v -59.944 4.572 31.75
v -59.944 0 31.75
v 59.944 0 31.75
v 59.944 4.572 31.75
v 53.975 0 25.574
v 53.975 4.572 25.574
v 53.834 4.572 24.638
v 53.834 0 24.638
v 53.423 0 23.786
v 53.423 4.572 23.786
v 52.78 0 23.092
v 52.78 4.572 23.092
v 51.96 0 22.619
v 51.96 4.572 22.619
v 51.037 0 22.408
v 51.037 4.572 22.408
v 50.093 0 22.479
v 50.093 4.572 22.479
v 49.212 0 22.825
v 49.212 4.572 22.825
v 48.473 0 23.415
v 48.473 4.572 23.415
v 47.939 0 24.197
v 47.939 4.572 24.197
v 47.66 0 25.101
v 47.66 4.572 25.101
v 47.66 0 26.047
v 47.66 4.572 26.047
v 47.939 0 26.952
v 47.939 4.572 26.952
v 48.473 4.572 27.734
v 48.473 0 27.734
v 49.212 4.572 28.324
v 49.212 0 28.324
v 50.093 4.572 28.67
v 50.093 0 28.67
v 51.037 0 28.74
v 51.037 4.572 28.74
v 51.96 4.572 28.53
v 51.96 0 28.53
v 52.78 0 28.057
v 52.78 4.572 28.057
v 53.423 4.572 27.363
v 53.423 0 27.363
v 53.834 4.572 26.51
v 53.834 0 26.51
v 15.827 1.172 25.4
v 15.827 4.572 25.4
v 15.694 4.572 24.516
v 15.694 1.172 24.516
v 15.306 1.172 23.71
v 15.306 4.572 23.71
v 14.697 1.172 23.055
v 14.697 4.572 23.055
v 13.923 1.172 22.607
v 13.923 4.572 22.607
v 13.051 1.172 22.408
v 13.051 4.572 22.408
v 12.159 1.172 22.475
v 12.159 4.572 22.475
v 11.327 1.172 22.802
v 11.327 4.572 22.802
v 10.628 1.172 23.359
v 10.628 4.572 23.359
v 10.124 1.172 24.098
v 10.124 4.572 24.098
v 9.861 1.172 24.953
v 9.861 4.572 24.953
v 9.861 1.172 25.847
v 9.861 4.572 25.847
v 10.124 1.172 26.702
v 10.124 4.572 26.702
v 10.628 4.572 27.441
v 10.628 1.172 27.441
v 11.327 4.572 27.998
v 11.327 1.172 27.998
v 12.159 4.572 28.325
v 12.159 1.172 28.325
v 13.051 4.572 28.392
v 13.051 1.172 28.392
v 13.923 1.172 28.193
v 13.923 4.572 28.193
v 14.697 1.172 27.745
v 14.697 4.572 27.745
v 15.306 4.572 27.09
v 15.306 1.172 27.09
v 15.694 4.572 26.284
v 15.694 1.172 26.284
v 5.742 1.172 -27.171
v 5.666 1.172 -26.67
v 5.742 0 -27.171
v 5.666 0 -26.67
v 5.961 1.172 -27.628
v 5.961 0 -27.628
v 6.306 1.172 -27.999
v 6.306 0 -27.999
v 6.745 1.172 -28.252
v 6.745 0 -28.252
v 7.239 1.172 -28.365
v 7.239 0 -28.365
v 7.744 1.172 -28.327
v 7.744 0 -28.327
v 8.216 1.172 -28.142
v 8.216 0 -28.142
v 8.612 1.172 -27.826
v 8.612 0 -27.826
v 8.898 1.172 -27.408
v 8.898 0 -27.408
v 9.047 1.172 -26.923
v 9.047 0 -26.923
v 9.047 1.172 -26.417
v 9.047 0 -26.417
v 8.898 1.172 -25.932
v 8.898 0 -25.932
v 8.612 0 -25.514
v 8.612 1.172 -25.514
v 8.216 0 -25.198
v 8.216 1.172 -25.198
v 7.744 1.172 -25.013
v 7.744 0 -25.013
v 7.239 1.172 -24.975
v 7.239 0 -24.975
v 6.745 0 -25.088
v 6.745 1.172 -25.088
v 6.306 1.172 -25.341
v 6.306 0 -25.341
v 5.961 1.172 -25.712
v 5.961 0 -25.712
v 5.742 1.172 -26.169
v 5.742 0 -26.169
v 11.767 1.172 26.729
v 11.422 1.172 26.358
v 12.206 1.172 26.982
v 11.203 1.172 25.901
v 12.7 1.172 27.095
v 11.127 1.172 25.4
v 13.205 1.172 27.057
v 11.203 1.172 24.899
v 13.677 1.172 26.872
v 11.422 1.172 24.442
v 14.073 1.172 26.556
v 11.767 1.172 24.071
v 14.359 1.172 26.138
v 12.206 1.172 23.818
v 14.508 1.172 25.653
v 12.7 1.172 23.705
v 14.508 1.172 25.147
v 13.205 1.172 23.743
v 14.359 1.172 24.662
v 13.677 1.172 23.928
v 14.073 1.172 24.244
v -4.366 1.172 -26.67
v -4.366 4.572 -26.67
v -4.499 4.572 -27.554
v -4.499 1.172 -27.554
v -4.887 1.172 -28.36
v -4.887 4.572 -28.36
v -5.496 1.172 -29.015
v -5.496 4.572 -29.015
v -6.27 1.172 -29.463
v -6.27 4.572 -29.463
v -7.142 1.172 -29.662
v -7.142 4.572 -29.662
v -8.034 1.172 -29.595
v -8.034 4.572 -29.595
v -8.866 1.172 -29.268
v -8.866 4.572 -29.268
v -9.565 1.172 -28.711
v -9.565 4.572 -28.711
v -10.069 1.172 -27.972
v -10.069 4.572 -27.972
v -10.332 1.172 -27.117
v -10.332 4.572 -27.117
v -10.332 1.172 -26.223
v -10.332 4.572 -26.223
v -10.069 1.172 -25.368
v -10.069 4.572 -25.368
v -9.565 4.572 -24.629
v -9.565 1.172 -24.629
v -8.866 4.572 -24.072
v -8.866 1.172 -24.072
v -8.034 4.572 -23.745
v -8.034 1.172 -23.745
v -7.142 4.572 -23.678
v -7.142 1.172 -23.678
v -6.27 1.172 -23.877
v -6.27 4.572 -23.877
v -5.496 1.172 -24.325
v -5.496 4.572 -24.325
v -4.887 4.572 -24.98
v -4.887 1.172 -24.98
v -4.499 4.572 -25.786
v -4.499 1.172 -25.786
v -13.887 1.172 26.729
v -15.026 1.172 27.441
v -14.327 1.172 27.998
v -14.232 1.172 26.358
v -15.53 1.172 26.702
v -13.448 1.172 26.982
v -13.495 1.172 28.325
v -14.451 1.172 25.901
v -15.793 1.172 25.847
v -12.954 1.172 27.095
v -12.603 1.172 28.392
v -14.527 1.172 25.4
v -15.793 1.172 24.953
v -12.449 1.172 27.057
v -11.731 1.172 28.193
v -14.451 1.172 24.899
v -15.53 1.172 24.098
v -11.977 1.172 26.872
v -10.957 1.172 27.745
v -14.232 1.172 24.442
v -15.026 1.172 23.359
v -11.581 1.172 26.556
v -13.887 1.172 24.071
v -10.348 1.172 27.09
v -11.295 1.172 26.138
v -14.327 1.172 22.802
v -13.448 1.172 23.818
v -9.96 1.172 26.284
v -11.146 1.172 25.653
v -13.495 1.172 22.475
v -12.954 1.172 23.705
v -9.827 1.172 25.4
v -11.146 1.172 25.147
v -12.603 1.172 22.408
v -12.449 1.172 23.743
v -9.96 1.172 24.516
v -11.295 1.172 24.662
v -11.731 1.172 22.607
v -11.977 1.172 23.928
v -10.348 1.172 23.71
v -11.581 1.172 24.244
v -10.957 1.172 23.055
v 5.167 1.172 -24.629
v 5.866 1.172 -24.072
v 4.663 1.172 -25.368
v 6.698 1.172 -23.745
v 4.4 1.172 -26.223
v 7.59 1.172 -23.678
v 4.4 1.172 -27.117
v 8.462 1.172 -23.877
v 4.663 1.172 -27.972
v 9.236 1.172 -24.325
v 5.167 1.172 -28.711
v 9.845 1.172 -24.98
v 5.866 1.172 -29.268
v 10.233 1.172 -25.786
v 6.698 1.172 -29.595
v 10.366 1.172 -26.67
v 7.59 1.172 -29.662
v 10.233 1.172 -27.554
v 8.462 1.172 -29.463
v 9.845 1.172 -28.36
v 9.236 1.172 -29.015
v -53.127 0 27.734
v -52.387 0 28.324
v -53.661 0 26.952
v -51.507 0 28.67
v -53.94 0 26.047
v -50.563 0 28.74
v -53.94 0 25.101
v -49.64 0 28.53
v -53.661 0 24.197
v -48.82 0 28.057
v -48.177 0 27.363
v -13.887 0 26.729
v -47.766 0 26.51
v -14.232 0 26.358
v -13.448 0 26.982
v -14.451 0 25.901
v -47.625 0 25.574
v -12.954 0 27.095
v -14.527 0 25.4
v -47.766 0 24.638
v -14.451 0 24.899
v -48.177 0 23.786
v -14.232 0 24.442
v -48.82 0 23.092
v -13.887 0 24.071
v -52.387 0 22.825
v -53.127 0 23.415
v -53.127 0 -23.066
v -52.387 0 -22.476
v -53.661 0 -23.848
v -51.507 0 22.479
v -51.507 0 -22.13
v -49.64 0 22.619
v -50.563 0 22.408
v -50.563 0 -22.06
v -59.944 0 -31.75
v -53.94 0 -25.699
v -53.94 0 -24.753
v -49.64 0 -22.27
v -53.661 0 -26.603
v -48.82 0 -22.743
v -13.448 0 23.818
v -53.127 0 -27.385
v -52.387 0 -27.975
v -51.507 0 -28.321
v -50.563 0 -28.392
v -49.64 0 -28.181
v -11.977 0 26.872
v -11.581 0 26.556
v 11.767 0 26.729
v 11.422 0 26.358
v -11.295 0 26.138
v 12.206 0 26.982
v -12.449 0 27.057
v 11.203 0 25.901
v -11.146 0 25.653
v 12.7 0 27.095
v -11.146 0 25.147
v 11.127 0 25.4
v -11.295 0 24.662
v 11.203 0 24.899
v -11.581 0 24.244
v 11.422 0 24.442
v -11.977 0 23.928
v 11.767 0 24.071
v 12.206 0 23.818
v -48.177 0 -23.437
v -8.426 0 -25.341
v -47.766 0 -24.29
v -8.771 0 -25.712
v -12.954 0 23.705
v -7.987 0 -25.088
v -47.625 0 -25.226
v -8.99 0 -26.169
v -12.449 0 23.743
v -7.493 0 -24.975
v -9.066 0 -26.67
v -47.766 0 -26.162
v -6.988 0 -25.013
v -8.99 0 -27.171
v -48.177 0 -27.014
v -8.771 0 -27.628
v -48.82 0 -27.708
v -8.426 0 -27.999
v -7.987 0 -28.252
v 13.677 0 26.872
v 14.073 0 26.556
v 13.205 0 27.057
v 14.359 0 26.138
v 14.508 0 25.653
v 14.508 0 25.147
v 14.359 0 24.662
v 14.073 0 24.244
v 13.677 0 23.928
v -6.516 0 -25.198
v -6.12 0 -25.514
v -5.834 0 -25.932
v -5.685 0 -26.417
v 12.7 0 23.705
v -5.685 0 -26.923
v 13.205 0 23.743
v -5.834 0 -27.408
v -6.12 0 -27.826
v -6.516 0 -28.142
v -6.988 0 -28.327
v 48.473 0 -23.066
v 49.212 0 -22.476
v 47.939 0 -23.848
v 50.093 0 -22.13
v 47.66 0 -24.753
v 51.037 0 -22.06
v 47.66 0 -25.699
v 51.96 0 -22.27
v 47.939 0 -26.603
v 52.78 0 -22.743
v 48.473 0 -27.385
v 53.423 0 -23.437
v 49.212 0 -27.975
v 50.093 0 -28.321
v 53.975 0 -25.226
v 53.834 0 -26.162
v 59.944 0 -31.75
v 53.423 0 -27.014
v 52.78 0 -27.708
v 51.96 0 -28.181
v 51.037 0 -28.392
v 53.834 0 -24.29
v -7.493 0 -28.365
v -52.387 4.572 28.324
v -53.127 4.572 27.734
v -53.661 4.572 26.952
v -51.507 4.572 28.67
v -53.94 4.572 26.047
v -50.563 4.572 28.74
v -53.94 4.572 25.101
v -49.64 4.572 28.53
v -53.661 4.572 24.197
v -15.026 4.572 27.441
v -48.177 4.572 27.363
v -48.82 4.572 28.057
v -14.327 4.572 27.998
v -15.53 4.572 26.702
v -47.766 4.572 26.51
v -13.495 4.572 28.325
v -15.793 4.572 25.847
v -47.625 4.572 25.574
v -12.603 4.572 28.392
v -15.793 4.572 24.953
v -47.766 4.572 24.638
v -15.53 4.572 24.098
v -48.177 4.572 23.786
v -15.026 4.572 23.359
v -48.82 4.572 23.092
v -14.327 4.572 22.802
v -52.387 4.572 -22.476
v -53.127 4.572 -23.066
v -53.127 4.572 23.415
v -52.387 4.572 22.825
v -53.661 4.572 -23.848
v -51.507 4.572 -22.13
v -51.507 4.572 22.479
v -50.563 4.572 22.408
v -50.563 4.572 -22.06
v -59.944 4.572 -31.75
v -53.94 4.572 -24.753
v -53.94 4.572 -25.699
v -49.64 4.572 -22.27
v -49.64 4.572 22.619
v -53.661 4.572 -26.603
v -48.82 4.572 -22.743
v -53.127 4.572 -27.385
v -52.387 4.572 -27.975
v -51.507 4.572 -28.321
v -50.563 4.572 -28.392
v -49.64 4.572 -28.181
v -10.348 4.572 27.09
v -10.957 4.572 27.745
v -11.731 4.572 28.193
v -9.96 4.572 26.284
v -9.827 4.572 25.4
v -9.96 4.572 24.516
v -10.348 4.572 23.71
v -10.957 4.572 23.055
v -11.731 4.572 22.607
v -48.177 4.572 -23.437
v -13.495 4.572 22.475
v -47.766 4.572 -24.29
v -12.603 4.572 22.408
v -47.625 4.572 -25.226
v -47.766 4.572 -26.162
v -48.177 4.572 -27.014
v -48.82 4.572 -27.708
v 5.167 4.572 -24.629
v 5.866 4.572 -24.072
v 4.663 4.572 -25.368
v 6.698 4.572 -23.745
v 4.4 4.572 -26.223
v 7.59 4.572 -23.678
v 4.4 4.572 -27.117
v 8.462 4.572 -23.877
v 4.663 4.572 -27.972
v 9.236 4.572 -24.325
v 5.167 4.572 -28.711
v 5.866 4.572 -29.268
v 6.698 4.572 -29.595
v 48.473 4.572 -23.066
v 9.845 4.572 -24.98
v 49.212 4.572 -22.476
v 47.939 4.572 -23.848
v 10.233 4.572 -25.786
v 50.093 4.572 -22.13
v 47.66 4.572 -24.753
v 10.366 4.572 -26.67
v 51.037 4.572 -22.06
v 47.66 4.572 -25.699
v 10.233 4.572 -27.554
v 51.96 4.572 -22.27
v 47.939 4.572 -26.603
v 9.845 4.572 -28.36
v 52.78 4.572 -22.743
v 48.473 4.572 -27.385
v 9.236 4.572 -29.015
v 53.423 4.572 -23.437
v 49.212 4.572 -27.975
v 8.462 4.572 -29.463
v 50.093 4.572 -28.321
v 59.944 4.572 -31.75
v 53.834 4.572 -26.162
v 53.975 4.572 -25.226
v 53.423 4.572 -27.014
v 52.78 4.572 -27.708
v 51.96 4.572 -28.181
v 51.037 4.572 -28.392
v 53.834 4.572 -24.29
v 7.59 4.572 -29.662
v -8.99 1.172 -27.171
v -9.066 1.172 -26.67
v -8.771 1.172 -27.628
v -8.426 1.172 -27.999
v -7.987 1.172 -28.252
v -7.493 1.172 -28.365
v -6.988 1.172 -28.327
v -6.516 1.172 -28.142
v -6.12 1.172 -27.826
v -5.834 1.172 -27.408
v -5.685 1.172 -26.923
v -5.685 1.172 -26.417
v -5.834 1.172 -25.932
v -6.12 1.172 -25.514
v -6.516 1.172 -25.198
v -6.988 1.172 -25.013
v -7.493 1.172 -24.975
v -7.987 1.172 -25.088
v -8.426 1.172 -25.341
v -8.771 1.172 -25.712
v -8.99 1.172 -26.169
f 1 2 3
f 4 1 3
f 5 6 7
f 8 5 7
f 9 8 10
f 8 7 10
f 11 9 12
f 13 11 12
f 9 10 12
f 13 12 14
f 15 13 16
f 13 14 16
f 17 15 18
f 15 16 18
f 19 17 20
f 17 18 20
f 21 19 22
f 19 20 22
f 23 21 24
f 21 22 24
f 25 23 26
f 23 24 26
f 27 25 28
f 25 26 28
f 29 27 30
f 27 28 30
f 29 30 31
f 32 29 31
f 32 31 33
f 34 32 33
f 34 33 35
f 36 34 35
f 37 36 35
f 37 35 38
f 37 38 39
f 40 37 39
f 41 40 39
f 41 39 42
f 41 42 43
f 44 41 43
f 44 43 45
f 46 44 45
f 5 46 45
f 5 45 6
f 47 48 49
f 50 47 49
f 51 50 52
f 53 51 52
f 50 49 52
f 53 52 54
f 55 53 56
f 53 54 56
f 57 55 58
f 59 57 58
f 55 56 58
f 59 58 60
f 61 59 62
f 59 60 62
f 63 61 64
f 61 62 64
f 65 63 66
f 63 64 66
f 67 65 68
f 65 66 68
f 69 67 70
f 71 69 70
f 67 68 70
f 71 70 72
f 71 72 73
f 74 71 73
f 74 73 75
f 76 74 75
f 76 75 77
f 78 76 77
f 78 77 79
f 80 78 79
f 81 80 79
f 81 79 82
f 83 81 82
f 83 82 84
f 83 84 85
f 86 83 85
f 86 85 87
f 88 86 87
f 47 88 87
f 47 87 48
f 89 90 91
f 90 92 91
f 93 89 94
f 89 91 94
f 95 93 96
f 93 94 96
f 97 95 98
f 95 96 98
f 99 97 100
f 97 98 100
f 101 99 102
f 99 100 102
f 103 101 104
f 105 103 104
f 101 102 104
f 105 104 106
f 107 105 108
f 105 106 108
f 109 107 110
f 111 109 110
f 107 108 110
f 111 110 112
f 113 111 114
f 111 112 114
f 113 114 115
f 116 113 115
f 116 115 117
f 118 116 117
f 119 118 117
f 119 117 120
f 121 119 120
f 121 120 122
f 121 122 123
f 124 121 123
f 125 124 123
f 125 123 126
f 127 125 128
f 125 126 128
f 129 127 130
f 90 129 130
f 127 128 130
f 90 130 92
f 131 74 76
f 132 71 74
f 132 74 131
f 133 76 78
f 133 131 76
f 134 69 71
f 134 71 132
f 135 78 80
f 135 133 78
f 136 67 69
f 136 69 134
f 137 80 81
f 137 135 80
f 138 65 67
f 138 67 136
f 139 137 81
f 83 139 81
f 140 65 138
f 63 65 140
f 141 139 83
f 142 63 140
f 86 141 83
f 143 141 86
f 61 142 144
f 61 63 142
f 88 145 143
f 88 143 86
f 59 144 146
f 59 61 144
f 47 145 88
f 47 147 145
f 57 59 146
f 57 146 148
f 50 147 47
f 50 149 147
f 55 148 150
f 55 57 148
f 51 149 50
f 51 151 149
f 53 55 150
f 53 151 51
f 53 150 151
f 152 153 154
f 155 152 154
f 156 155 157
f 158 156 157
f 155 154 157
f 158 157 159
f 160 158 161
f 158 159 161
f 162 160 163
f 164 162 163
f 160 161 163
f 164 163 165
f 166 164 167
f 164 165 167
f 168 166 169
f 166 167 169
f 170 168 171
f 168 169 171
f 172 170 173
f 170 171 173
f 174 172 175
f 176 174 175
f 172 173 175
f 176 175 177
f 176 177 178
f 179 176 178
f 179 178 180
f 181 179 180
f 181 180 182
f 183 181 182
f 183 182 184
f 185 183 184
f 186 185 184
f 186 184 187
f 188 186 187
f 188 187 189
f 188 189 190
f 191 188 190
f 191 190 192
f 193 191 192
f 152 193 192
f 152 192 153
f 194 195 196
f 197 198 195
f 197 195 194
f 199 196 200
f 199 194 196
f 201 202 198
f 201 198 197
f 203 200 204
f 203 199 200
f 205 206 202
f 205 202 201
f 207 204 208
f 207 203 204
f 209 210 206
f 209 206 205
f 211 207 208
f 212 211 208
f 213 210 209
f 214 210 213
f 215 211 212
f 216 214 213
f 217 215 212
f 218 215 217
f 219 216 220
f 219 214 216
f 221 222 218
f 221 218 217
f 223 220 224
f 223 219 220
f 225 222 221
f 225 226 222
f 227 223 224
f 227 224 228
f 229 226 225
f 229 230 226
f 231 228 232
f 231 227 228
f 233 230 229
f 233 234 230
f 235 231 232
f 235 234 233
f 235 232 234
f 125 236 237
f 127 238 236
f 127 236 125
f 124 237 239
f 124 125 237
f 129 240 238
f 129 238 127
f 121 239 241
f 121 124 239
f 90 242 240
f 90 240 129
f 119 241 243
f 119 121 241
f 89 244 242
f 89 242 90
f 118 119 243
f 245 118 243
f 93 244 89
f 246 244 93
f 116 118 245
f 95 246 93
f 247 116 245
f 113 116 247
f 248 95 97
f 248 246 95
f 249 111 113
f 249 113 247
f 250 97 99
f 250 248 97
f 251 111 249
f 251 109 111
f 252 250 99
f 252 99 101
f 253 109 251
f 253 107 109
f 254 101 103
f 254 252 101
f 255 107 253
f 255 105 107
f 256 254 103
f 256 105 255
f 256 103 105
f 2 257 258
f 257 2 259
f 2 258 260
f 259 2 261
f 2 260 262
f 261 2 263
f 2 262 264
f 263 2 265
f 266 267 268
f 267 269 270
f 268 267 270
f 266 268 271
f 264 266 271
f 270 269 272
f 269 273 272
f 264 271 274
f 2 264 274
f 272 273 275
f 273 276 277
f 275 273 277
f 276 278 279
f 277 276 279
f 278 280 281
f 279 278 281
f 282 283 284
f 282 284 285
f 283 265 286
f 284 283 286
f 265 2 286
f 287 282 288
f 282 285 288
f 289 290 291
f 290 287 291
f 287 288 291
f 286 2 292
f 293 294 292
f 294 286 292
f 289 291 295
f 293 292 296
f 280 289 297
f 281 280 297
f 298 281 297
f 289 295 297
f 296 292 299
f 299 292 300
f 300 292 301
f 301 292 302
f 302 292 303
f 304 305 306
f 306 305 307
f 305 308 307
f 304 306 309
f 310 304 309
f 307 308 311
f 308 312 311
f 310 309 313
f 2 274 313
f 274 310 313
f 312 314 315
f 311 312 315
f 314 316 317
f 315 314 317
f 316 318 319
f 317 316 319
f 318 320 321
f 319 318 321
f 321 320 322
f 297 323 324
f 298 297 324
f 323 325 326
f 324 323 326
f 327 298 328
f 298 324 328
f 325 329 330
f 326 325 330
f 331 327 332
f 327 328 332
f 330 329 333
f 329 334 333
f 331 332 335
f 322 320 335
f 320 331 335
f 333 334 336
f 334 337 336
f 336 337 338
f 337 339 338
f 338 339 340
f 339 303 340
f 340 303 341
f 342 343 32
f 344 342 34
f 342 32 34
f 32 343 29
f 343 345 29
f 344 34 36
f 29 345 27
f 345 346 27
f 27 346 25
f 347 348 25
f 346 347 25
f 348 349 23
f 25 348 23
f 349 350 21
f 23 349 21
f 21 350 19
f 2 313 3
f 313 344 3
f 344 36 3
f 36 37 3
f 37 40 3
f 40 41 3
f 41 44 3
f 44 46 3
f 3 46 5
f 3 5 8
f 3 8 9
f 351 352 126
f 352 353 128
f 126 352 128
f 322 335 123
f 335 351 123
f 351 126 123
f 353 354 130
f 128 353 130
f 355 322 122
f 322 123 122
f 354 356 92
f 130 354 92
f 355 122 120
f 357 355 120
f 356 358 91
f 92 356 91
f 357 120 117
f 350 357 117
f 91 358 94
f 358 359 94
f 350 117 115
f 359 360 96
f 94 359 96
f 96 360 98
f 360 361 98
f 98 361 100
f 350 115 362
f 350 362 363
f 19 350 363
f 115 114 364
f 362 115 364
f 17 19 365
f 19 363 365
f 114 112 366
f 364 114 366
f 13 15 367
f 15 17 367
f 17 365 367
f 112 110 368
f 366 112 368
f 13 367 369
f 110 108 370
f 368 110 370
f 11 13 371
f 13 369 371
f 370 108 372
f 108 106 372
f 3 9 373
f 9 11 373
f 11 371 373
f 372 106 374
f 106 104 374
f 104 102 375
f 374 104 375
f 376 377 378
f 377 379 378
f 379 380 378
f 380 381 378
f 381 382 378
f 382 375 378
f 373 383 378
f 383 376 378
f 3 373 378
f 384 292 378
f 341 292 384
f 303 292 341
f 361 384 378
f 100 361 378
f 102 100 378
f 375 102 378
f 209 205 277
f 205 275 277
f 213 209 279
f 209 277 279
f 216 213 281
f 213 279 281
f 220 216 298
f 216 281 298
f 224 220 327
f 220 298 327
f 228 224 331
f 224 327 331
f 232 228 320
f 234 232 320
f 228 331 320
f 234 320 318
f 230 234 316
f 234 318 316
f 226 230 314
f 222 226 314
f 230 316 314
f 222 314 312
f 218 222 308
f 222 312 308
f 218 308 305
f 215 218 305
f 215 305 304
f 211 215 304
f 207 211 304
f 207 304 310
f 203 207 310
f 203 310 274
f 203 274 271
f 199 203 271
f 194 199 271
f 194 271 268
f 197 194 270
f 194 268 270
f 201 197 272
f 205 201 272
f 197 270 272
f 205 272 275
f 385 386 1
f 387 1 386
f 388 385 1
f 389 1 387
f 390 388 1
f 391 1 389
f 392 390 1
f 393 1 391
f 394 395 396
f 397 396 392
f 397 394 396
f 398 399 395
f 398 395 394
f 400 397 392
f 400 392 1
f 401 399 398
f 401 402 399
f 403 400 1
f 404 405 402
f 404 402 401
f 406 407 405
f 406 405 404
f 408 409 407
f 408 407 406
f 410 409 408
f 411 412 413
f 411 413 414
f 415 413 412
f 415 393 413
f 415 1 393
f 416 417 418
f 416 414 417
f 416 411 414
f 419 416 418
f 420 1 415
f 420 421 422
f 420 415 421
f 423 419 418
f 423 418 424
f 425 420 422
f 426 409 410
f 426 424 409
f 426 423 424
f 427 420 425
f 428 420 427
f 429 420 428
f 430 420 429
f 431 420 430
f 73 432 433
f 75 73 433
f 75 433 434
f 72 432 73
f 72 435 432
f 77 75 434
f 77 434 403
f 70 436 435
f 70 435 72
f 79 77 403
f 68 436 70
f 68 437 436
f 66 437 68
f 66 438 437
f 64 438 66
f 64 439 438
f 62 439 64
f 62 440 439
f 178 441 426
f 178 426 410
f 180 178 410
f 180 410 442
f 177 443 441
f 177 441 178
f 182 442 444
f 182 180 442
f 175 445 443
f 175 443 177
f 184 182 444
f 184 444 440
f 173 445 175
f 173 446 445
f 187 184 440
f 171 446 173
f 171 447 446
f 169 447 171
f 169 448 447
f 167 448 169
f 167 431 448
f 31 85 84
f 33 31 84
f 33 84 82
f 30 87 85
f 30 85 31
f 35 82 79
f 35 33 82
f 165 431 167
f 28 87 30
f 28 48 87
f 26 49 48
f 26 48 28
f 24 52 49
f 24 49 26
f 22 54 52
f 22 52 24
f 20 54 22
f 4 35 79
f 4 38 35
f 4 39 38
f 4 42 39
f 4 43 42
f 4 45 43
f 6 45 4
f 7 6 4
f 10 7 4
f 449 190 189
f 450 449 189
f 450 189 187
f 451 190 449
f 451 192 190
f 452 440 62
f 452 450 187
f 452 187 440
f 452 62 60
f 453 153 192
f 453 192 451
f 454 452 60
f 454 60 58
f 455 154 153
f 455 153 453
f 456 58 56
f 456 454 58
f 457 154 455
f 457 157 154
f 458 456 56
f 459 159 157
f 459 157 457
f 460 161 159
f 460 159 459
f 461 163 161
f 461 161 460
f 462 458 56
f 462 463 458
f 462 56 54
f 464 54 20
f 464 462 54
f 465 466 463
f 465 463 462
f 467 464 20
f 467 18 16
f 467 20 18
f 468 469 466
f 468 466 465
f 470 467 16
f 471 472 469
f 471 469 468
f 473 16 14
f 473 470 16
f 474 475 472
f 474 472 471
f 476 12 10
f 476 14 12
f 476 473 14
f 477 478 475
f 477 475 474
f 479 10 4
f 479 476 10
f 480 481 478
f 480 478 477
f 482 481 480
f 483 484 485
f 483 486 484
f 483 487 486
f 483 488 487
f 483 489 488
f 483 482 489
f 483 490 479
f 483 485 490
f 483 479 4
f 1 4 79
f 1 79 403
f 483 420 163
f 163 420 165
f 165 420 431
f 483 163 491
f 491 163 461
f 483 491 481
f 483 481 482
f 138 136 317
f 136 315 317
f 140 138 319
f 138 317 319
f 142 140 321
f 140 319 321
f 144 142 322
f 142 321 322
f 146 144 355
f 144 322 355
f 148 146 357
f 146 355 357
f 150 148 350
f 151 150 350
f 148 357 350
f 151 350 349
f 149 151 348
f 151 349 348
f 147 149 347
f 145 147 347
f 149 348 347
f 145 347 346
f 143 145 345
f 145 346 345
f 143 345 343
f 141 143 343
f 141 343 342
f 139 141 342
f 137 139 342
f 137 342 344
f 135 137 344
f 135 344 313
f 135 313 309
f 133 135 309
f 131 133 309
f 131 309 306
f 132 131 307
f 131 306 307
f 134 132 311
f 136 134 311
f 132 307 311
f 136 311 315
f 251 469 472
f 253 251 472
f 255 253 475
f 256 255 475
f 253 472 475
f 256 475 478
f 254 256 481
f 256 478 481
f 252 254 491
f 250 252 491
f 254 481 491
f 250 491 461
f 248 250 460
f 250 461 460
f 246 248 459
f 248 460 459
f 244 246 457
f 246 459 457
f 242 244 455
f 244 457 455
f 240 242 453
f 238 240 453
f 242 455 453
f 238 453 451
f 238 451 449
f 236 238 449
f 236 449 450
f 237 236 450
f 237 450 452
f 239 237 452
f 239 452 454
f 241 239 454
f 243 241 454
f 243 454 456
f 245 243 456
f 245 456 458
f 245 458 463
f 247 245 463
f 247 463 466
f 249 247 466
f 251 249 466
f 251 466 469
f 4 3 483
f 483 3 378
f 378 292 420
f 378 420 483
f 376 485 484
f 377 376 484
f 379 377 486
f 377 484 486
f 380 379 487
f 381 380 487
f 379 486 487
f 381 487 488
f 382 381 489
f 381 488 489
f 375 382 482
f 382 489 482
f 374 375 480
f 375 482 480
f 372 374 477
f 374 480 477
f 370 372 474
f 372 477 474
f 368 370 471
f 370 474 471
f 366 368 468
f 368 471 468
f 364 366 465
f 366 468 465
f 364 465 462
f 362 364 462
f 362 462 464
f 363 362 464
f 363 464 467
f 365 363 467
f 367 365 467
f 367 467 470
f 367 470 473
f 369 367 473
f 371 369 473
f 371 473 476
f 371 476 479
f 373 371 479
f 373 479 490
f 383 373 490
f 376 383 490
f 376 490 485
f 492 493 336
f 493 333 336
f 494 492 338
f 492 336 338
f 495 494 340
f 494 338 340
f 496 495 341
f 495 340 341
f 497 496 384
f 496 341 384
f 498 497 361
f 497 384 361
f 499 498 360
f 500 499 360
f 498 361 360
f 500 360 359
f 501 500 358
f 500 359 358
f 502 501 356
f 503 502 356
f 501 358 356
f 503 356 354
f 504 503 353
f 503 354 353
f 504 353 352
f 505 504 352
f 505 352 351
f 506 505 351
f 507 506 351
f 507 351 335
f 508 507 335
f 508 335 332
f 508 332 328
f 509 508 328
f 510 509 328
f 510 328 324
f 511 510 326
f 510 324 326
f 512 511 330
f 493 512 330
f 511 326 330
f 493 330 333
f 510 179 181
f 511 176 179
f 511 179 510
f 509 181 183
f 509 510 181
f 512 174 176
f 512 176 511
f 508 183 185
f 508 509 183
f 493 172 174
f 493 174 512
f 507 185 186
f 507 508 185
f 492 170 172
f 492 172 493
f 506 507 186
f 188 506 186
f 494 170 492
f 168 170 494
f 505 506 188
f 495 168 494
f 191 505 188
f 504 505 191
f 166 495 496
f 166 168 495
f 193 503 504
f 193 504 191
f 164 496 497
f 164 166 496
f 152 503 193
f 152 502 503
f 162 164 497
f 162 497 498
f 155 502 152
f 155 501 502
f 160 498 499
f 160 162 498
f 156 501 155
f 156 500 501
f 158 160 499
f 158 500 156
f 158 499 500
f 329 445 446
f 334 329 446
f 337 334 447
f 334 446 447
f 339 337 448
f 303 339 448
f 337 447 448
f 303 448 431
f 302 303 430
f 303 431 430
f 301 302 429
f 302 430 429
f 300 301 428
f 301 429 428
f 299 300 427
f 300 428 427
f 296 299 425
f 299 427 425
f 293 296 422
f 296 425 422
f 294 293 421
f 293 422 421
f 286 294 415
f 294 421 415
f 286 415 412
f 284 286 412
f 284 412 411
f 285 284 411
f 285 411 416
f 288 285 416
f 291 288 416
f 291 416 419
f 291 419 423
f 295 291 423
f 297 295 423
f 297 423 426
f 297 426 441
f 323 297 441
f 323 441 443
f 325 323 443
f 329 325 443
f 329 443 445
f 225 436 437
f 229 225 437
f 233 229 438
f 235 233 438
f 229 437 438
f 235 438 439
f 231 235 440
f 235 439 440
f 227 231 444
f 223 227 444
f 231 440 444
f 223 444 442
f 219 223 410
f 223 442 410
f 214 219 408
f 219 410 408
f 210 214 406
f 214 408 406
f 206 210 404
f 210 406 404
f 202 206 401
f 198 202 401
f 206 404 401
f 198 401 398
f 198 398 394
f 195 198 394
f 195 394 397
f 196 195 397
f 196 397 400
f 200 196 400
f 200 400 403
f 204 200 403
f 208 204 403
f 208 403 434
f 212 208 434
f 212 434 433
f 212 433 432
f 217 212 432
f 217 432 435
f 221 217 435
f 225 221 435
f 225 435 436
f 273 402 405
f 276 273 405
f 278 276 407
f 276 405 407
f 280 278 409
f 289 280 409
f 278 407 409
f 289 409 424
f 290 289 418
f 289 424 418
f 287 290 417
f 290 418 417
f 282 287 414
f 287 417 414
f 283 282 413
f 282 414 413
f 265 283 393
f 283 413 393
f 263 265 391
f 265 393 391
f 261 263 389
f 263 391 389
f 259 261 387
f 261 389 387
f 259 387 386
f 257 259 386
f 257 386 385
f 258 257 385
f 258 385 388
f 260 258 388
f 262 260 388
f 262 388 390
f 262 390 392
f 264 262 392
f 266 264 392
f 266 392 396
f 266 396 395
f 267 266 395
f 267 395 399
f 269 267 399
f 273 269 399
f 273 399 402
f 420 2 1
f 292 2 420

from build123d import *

# Parameters (mm, degrees)
SKETCH1_W                                            = 119.888
SKETCH1_H                                            = 63.5
BOSS_EXTRUDE1_DEPTH                                  = 4.572
CBORE_FOR_M3_HEXAGON_SOCKET_HEAD_CAP_SCR_D           = 3.4
CBORE_FOR_M3_HEXAGON_SOCKET_HEAD_CAP_SCR_CBORE_D     = 6
CBORE_FOR_M3_HEXAGON_SOCKET_HEAD_CAP_SCR_CBORE_DEPTH = 3.4
SKETCH5_R                                            = 3.175
CUT_EXTRUDE1_DEPTH                                   = 5.572


with BuildPart() as part:
    # Sketch1 → Boss-Extrude1 (new body)
    with BuildSketch(Plane(origin=(0, 0, 0), x_dir=(1, 0, 0), z_dir=(0, 1, 0))):
        Rectangle(SKETCH1_W, SKETCH1_H)
    extrude(amount=BOSS_EXTRUDE1_DEPTH)

    # CBORE for M3 Hexagon socket head cap screws1 (through all)
    with Locations(Plane(origin=(0, 4.572, 0), x_dir=(1, 0, 0), z_dir=(0, 1, 0))):
        with Locations((7.366, 26.67), (12.827, -25.4), (-12.827, -25.4), (-7.366, 26.67)):
            CounterBoreHole(CBORE_FOR_M3_HEXAGON_SOCKET_HEAD_CAP_SCR_D / 2, CBORE_FOR_M3_HEXAGON_SOCKET_HEAD_CAP_SCR_CBORE_D / 2, CBORE_FOR_M3_HEXAGON_SOCKET_HEAD_CAP_SCR_CBORE_DEPTH)

    # Sketch5 → Cut-Extrude1 (cut, through all)
    with BuildSketch(Plane(origin=(0, 4.572, 0), x_dir=(1, 0, 0), z_dir=(0, 1, 0))):
        with Locations((50.8, 25.225713352)):
            Circle(SKETCH5_R)
        with Locations((50.8, -25.574286648)):
            Circle(SKETCH5_R)
        with Locations((-50.8, 25.225713352)):
            Circle(SKETCH5_R)
        with Locations((-50.8, -25.574286648)):
            Circle(SKETCH5_R)
    extrude(amount=-CUT_EXTRUDE1_DEPTH, mode=Mode.SUBTRACT)


solid = part.part
